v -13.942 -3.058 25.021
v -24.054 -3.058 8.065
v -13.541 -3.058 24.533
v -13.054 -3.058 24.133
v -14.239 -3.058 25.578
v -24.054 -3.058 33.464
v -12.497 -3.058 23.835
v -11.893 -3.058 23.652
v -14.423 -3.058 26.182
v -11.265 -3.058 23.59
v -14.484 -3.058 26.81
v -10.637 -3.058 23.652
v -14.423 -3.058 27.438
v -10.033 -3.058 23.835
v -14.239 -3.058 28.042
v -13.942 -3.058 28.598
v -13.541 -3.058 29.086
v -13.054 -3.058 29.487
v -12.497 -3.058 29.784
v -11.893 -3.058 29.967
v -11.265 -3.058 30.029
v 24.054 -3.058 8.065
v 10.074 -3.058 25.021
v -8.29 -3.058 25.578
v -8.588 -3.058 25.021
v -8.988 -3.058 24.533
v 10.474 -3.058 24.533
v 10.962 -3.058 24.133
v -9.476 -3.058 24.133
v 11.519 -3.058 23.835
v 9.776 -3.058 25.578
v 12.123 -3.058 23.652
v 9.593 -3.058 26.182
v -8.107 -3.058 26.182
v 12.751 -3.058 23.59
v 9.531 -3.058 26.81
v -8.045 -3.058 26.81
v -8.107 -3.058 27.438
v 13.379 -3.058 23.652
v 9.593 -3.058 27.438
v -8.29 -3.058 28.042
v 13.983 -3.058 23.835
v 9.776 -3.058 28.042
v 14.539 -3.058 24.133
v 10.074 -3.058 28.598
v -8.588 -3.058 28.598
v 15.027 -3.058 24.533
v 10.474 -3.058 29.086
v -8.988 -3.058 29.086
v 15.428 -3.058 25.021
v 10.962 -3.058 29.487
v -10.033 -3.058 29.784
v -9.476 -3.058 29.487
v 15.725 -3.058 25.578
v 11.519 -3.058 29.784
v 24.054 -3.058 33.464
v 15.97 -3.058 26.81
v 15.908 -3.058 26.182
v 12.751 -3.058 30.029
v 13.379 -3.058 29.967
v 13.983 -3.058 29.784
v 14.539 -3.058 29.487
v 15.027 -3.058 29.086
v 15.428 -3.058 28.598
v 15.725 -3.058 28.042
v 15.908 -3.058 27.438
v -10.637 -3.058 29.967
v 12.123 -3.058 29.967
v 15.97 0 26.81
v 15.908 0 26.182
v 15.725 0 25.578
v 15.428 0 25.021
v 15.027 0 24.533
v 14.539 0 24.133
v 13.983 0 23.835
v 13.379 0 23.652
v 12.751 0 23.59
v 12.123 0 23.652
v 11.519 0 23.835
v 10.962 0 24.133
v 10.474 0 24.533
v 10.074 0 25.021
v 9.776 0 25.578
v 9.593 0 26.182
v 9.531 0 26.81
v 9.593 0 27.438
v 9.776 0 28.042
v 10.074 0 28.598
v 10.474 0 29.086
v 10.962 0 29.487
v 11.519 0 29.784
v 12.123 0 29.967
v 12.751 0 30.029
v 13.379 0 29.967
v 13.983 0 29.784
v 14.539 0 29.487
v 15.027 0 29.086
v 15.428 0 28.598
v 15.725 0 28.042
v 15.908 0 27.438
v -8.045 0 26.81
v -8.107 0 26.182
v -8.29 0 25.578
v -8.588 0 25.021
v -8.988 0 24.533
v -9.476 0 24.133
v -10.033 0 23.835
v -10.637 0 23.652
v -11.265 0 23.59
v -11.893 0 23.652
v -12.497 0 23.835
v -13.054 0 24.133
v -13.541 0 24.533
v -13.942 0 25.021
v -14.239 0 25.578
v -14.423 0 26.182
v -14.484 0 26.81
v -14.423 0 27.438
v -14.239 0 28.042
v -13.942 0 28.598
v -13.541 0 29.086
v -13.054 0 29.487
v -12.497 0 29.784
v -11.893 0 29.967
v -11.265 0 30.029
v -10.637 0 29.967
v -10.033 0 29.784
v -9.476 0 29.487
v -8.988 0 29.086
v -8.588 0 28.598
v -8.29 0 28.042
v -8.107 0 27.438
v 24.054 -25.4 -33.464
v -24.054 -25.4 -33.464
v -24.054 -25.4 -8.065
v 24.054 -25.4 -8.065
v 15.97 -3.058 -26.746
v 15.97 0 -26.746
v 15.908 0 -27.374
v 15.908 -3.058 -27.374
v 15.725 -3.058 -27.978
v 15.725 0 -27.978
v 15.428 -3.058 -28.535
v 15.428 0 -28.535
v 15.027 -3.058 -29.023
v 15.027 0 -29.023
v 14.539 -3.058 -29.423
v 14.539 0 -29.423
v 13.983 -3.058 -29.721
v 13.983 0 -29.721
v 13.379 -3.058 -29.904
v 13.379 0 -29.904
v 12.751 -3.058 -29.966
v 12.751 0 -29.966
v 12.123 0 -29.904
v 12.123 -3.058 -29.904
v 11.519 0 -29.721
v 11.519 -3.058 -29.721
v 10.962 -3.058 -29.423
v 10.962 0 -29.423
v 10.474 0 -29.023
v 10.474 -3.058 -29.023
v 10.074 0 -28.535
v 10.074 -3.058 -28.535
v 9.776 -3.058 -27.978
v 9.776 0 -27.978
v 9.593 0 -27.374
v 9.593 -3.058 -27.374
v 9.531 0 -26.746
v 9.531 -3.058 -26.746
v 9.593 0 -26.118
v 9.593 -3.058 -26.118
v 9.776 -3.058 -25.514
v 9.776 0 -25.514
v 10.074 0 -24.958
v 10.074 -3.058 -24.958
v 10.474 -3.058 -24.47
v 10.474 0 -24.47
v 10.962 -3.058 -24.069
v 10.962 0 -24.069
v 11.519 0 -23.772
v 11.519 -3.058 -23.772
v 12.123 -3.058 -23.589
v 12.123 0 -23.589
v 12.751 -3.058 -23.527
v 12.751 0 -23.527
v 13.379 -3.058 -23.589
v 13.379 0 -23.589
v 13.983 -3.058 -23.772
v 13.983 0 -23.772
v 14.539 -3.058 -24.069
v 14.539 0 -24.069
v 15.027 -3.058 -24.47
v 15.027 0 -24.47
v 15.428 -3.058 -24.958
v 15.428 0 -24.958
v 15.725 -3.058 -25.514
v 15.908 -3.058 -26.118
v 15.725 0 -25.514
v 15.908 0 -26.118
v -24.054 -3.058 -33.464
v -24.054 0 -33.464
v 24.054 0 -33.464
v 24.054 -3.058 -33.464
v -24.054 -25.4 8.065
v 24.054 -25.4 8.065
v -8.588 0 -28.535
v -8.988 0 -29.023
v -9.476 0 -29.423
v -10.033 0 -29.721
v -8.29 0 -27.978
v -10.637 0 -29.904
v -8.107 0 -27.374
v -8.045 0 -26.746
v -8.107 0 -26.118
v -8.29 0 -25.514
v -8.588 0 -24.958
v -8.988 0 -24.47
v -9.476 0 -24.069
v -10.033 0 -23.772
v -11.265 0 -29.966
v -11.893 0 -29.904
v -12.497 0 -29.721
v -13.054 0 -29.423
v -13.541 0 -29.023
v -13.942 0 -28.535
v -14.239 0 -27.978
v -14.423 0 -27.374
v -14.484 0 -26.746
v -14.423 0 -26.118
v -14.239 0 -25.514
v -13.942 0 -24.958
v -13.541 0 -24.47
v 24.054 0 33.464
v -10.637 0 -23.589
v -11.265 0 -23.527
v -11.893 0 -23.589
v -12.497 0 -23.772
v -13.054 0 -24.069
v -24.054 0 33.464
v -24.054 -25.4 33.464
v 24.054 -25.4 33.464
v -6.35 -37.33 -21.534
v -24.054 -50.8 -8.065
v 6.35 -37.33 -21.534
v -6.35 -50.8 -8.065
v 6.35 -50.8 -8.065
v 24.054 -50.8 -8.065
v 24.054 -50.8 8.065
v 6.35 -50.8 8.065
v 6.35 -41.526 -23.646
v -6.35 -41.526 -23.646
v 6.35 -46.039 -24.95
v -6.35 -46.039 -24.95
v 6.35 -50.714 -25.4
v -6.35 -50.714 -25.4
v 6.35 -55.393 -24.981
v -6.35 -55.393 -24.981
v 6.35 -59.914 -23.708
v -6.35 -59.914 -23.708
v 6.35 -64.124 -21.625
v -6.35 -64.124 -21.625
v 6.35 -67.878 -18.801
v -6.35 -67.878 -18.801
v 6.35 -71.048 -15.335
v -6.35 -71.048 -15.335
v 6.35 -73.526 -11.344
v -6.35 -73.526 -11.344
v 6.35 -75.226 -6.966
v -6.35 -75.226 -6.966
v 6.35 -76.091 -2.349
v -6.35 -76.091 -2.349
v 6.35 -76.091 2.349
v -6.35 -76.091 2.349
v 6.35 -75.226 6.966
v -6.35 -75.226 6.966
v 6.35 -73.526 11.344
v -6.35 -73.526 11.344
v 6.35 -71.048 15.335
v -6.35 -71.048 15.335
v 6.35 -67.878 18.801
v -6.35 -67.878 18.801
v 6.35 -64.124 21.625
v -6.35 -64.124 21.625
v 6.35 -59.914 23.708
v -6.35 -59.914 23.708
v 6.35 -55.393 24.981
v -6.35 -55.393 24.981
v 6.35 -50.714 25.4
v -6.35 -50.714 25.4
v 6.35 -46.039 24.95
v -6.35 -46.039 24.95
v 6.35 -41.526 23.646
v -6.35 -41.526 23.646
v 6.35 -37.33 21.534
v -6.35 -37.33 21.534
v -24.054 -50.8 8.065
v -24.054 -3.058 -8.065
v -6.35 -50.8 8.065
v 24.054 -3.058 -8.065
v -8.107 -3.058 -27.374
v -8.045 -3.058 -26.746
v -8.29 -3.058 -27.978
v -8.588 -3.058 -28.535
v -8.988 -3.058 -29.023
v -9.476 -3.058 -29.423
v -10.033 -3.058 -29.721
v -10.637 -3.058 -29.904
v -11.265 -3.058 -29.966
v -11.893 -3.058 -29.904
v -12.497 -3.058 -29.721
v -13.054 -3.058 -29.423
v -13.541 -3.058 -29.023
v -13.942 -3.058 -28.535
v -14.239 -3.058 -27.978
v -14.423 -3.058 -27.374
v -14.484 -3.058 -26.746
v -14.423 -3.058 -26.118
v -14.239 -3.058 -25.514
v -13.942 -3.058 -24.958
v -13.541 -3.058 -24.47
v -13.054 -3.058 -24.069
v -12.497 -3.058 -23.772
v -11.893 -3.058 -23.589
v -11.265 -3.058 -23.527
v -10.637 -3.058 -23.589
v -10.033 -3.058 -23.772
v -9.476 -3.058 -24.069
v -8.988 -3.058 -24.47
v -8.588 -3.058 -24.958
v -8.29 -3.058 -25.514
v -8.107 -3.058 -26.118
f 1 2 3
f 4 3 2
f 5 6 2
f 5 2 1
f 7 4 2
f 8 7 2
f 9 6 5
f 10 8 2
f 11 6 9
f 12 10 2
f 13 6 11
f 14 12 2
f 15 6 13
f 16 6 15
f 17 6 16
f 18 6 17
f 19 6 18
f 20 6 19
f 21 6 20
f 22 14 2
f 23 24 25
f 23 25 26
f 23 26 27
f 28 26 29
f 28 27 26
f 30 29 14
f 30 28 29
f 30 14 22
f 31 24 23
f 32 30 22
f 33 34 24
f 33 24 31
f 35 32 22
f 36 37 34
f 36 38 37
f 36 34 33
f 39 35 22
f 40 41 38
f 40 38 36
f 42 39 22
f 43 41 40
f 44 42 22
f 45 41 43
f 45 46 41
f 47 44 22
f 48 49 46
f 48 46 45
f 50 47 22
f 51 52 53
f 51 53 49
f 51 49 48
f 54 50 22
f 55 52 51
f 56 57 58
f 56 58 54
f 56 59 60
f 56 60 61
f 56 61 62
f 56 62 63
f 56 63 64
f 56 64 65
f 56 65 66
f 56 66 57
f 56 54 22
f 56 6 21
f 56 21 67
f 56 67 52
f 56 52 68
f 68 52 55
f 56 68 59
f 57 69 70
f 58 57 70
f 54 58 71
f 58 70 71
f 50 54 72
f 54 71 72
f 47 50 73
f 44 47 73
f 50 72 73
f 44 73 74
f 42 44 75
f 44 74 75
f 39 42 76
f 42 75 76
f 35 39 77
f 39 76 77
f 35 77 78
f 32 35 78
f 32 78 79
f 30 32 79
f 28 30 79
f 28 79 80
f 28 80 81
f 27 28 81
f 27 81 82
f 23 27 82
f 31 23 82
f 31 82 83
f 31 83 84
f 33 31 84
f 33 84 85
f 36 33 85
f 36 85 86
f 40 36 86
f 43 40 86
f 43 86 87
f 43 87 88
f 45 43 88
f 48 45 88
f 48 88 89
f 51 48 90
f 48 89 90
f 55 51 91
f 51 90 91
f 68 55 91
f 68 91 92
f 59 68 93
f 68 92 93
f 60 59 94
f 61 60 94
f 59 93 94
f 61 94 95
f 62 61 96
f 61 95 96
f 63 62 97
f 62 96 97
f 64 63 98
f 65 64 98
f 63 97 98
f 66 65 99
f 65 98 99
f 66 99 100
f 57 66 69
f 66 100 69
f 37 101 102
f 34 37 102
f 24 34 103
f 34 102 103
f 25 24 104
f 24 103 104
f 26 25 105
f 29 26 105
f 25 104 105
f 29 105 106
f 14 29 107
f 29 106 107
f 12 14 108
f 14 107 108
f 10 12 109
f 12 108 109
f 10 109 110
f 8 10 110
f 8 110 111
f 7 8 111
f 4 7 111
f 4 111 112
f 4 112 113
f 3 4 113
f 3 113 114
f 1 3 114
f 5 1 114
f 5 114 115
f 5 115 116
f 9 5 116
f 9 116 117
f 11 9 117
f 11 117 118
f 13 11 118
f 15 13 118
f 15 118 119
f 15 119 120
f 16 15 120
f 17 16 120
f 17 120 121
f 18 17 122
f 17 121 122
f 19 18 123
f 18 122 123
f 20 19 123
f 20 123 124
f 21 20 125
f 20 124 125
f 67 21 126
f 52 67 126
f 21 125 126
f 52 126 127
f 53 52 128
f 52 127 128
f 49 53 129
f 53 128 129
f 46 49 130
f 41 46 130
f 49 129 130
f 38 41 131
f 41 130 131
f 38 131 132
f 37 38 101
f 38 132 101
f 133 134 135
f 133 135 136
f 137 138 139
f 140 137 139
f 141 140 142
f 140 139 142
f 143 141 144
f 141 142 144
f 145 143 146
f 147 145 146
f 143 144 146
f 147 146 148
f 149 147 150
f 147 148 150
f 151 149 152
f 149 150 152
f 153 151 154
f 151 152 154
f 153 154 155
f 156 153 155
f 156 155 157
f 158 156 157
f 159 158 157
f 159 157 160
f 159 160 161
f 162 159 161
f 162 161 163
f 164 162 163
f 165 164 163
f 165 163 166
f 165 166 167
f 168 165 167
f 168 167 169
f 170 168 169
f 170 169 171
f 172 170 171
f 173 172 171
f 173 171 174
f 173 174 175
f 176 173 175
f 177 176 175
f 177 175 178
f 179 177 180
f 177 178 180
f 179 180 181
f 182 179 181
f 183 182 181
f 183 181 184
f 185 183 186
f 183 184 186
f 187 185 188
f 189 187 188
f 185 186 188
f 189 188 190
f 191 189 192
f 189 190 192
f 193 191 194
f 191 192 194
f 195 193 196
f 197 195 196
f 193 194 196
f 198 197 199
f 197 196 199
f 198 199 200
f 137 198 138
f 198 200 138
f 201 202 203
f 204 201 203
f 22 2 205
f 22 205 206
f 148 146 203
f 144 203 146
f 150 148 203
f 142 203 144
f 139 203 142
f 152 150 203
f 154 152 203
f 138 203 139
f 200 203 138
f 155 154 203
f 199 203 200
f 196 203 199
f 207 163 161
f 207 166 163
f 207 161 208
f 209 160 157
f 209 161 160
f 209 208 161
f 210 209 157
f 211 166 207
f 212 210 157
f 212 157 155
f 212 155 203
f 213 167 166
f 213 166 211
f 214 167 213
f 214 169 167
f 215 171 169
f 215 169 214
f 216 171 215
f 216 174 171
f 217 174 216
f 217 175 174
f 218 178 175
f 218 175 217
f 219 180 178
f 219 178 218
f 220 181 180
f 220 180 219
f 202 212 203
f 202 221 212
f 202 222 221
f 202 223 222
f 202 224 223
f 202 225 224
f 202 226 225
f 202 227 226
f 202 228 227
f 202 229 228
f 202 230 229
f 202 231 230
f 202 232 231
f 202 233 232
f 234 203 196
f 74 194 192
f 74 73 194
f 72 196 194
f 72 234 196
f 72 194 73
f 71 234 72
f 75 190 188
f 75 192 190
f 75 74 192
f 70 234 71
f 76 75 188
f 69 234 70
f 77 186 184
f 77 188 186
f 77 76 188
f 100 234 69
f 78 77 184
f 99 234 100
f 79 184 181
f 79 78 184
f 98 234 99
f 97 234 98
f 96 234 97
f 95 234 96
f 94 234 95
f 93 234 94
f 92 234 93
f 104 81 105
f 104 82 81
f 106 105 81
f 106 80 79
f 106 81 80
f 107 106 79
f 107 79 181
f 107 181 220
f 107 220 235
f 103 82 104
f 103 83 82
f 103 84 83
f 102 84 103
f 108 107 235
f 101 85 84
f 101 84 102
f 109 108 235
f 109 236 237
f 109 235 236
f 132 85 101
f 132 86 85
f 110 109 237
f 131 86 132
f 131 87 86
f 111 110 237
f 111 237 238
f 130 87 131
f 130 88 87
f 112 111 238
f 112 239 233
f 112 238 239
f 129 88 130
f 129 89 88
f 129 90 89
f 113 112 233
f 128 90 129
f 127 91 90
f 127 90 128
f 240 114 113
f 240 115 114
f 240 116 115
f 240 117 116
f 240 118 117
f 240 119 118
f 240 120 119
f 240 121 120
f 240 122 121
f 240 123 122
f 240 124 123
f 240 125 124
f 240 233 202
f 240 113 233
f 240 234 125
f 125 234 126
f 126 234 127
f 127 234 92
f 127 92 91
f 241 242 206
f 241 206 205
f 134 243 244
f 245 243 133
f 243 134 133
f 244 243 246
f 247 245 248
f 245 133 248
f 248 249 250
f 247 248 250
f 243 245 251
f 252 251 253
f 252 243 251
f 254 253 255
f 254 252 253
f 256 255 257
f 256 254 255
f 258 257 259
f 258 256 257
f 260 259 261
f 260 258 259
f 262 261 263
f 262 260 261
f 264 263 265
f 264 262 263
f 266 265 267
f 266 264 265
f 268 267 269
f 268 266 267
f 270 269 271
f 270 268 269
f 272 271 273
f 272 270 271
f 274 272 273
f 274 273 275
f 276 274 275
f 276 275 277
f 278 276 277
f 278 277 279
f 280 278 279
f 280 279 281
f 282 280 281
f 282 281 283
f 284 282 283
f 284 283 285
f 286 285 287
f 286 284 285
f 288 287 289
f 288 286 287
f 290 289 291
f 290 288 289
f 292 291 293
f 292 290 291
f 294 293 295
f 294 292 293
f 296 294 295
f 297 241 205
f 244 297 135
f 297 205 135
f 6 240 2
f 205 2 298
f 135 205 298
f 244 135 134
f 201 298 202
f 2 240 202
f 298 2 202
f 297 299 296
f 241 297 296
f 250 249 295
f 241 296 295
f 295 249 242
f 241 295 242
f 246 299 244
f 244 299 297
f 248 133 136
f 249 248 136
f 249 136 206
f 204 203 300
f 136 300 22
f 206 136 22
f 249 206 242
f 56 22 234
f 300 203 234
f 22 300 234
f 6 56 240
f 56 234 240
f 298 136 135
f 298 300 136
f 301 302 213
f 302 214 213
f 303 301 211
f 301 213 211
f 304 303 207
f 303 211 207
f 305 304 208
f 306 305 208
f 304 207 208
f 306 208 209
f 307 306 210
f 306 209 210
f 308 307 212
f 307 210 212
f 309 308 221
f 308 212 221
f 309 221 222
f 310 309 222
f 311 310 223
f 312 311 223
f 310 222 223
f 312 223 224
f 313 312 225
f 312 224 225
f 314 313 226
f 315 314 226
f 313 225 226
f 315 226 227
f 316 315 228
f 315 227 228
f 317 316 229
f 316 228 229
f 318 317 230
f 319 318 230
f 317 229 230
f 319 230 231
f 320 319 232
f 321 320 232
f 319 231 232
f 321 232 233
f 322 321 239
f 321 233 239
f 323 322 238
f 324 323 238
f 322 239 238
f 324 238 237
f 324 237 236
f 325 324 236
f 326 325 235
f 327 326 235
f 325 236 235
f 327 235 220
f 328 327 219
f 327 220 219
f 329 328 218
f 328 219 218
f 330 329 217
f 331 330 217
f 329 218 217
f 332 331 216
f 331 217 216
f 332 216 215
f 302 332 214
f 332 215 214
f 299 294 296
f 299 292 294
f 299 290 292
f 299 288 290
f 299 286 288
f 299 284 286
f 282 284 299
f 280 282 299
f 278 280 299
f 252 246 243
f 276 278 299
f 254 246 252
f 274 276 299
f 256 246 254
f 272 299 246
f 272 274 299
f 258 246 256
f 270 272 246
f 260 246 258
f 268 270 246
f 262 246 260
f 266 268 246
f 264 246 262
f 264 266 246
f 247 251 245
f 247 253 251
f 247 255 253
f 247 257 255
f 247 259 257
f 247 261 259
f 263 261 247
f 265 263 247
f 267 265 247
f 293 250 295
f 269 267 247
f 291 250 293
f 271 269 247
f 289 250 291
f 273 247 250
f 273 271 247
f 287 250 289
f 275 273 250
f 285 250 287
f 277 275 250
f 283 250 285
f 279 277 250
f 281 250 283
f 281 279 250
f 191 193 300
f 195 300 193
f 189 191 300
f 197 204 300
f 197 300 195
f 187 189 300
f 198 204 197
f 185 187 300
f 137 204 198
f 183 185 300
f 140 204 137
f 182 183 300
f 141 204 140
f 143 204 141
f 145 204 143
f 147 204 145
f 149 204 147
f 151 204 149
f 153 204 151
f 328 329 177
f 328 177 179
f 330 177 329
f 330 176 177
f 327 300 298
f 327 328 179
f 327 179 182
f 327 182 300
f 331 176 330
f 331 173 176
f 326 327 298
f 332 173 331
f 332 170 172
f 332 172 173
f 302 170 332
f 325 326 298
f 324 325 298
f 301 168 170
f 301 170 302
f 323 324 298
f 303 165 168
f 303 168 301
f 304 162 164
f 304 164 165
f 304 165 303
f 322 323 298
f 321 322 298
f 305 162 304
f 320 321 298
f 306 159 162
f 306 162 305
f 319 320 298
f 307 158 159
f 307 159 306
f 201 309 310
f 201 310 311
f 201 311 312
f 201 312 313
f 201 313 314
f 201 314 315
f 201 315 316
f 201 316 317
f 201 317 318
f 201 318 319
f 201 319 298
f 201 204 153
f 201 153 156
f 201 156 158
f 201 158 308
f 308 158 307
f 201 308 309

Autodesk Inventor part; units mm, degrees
ref_plane "YZ Plane" through (0, 0, 0) normal (1, 0, 0) x (0, 1, 0)
ref_plane "XZ Plane" through (0, 0, 0) normal (0, 1, 0) x (-1, 0, 0)
ref_plane "XY Plane" through (0, 0, 0) normal (0, 0, 1) x (1, 0, 0)
sketch "Sketch10" plane through (0, 0, 0) normal (0, 1, 0) x (-1, 0, 0)
  line L0 (24.0538, -33.4645) -> (-24.0538, -33.4645)
  line L1 (-24.0538, -33.4645) -> (-24.0538, 33.4645)
  line L2 (-24.0538, 33.4645) -> (24.0538, 33.4645)
  line L3 (24.0538, 33.4645) -> (24.0538, -33.4645)
  line L4 (33.6753, 0) -> (-33.6753, 0) projected
  line L5 (0, -46.8503) -> (0, 46.8503) projected
  point P0 (0, 0)
  dimension "d17" = 66.929
  dimension "d18" = 48.1076
extrude "Extrusion4" add sketch "Sketch10" against normal blind 50.8
sketch "Sketch11" plane through (0, -50.8, 0) normal (0, -1, 0) x (1, 0, 0)
  line L0 (6.35, 25.4) -> (-6.35, 25.4)
  line L1 (-6.35, 25.4) -> (-6.35, 0)
  line L2 (-6.35, 0) -> (6.35, 0)
  line L3 (6.35, 0) -> (6.35, 25.4)
  line L4 (-33.6753, 0) -> (33.6753, 0) projected
  line L5 (0, -46.8503) -> (0, 46.8503) projected
  point P0 (0, 0)
  dimension "d21" = 25.4
  dimension "d22" = 12.7
revolve "Revolution3" add sketch "Sketch11" angle 360 about axis through (-6.35, -50.8, 0) along (1, 0, 0)
chamfer "Chamfer2" distance 25.4 angle 45 2 edges at (0, -50.8, -33.4645) (0, -50.8, 33.4645)
sketch "Sketch12" plane through (0, 0, 0) normal (0, 1, 0) x (1, 0, 0)
  circle A0 centre (12.7508, 26.7462) radius 3.2195
  line L0 (-24.0538, 33.4645) -> (24.0538, 33.4645) projected
  line L1 (24.0538, 33.4645) -> (24.0538, 8.0645) projected
  circle A1 centre (-11.2649, 26.7462) radius 3.2195
  circle A2 centre (12.7508, -26.8097) radius 3.2195
  circle A3 centre (-11.2649, -26.8097) radius 3.2195
  point P0 (0, 0)
  dimension "d27" = 6.4389
  dimension "d28" = 6.7183
  dimension "d29" = 11.303
  dimension "d32" = 24.0157
  dimension "d42" = 53.5559
  dimension "d46" = 24.0157
extrude "Extrusion5" cut sketch "Sketch12" against normal blind 5.08
sketch "Sketch13" plane through (-24.0538, 0, 33.4645) normal (0, 0, 1) x (1, 0, 0)
  line L0 (0, 0) -> (0, -25.4) projected
  line L1 (0, -3.0578) -> (48.1076, -3.0578)
  line L2 (48.1076, -3.0578) -> (48.1076, -25.4)
  line L3 (48.1076, -25.4) -> (0, -25.4)
  line L4 (0, -25.4) -> (0, -3.0578)
extrude "Extrusion6" cut sketch "Sketch13" against normal blind 25.4
sketch "Sketch14" plane through (24.0538, 0, -33.4645) normal (0, 0, -1) x (-1, 0, 0)
  line L0 (0, -3.0578) -> (48.1076, -3.0578)
  line L1 (48.1076, -3.0578) -> (48.1076, -25.4)
  line L2 (48.1076, -25.4) -> (0, -25.4)
  line L3 (0, -25.4) -> (0, -3.0578)
  point P0 (24.0538, 0)
extrude "Extrusion7" cut sketch "Sketch14" against normal blind 25.4
properties part number "caster wheel"
